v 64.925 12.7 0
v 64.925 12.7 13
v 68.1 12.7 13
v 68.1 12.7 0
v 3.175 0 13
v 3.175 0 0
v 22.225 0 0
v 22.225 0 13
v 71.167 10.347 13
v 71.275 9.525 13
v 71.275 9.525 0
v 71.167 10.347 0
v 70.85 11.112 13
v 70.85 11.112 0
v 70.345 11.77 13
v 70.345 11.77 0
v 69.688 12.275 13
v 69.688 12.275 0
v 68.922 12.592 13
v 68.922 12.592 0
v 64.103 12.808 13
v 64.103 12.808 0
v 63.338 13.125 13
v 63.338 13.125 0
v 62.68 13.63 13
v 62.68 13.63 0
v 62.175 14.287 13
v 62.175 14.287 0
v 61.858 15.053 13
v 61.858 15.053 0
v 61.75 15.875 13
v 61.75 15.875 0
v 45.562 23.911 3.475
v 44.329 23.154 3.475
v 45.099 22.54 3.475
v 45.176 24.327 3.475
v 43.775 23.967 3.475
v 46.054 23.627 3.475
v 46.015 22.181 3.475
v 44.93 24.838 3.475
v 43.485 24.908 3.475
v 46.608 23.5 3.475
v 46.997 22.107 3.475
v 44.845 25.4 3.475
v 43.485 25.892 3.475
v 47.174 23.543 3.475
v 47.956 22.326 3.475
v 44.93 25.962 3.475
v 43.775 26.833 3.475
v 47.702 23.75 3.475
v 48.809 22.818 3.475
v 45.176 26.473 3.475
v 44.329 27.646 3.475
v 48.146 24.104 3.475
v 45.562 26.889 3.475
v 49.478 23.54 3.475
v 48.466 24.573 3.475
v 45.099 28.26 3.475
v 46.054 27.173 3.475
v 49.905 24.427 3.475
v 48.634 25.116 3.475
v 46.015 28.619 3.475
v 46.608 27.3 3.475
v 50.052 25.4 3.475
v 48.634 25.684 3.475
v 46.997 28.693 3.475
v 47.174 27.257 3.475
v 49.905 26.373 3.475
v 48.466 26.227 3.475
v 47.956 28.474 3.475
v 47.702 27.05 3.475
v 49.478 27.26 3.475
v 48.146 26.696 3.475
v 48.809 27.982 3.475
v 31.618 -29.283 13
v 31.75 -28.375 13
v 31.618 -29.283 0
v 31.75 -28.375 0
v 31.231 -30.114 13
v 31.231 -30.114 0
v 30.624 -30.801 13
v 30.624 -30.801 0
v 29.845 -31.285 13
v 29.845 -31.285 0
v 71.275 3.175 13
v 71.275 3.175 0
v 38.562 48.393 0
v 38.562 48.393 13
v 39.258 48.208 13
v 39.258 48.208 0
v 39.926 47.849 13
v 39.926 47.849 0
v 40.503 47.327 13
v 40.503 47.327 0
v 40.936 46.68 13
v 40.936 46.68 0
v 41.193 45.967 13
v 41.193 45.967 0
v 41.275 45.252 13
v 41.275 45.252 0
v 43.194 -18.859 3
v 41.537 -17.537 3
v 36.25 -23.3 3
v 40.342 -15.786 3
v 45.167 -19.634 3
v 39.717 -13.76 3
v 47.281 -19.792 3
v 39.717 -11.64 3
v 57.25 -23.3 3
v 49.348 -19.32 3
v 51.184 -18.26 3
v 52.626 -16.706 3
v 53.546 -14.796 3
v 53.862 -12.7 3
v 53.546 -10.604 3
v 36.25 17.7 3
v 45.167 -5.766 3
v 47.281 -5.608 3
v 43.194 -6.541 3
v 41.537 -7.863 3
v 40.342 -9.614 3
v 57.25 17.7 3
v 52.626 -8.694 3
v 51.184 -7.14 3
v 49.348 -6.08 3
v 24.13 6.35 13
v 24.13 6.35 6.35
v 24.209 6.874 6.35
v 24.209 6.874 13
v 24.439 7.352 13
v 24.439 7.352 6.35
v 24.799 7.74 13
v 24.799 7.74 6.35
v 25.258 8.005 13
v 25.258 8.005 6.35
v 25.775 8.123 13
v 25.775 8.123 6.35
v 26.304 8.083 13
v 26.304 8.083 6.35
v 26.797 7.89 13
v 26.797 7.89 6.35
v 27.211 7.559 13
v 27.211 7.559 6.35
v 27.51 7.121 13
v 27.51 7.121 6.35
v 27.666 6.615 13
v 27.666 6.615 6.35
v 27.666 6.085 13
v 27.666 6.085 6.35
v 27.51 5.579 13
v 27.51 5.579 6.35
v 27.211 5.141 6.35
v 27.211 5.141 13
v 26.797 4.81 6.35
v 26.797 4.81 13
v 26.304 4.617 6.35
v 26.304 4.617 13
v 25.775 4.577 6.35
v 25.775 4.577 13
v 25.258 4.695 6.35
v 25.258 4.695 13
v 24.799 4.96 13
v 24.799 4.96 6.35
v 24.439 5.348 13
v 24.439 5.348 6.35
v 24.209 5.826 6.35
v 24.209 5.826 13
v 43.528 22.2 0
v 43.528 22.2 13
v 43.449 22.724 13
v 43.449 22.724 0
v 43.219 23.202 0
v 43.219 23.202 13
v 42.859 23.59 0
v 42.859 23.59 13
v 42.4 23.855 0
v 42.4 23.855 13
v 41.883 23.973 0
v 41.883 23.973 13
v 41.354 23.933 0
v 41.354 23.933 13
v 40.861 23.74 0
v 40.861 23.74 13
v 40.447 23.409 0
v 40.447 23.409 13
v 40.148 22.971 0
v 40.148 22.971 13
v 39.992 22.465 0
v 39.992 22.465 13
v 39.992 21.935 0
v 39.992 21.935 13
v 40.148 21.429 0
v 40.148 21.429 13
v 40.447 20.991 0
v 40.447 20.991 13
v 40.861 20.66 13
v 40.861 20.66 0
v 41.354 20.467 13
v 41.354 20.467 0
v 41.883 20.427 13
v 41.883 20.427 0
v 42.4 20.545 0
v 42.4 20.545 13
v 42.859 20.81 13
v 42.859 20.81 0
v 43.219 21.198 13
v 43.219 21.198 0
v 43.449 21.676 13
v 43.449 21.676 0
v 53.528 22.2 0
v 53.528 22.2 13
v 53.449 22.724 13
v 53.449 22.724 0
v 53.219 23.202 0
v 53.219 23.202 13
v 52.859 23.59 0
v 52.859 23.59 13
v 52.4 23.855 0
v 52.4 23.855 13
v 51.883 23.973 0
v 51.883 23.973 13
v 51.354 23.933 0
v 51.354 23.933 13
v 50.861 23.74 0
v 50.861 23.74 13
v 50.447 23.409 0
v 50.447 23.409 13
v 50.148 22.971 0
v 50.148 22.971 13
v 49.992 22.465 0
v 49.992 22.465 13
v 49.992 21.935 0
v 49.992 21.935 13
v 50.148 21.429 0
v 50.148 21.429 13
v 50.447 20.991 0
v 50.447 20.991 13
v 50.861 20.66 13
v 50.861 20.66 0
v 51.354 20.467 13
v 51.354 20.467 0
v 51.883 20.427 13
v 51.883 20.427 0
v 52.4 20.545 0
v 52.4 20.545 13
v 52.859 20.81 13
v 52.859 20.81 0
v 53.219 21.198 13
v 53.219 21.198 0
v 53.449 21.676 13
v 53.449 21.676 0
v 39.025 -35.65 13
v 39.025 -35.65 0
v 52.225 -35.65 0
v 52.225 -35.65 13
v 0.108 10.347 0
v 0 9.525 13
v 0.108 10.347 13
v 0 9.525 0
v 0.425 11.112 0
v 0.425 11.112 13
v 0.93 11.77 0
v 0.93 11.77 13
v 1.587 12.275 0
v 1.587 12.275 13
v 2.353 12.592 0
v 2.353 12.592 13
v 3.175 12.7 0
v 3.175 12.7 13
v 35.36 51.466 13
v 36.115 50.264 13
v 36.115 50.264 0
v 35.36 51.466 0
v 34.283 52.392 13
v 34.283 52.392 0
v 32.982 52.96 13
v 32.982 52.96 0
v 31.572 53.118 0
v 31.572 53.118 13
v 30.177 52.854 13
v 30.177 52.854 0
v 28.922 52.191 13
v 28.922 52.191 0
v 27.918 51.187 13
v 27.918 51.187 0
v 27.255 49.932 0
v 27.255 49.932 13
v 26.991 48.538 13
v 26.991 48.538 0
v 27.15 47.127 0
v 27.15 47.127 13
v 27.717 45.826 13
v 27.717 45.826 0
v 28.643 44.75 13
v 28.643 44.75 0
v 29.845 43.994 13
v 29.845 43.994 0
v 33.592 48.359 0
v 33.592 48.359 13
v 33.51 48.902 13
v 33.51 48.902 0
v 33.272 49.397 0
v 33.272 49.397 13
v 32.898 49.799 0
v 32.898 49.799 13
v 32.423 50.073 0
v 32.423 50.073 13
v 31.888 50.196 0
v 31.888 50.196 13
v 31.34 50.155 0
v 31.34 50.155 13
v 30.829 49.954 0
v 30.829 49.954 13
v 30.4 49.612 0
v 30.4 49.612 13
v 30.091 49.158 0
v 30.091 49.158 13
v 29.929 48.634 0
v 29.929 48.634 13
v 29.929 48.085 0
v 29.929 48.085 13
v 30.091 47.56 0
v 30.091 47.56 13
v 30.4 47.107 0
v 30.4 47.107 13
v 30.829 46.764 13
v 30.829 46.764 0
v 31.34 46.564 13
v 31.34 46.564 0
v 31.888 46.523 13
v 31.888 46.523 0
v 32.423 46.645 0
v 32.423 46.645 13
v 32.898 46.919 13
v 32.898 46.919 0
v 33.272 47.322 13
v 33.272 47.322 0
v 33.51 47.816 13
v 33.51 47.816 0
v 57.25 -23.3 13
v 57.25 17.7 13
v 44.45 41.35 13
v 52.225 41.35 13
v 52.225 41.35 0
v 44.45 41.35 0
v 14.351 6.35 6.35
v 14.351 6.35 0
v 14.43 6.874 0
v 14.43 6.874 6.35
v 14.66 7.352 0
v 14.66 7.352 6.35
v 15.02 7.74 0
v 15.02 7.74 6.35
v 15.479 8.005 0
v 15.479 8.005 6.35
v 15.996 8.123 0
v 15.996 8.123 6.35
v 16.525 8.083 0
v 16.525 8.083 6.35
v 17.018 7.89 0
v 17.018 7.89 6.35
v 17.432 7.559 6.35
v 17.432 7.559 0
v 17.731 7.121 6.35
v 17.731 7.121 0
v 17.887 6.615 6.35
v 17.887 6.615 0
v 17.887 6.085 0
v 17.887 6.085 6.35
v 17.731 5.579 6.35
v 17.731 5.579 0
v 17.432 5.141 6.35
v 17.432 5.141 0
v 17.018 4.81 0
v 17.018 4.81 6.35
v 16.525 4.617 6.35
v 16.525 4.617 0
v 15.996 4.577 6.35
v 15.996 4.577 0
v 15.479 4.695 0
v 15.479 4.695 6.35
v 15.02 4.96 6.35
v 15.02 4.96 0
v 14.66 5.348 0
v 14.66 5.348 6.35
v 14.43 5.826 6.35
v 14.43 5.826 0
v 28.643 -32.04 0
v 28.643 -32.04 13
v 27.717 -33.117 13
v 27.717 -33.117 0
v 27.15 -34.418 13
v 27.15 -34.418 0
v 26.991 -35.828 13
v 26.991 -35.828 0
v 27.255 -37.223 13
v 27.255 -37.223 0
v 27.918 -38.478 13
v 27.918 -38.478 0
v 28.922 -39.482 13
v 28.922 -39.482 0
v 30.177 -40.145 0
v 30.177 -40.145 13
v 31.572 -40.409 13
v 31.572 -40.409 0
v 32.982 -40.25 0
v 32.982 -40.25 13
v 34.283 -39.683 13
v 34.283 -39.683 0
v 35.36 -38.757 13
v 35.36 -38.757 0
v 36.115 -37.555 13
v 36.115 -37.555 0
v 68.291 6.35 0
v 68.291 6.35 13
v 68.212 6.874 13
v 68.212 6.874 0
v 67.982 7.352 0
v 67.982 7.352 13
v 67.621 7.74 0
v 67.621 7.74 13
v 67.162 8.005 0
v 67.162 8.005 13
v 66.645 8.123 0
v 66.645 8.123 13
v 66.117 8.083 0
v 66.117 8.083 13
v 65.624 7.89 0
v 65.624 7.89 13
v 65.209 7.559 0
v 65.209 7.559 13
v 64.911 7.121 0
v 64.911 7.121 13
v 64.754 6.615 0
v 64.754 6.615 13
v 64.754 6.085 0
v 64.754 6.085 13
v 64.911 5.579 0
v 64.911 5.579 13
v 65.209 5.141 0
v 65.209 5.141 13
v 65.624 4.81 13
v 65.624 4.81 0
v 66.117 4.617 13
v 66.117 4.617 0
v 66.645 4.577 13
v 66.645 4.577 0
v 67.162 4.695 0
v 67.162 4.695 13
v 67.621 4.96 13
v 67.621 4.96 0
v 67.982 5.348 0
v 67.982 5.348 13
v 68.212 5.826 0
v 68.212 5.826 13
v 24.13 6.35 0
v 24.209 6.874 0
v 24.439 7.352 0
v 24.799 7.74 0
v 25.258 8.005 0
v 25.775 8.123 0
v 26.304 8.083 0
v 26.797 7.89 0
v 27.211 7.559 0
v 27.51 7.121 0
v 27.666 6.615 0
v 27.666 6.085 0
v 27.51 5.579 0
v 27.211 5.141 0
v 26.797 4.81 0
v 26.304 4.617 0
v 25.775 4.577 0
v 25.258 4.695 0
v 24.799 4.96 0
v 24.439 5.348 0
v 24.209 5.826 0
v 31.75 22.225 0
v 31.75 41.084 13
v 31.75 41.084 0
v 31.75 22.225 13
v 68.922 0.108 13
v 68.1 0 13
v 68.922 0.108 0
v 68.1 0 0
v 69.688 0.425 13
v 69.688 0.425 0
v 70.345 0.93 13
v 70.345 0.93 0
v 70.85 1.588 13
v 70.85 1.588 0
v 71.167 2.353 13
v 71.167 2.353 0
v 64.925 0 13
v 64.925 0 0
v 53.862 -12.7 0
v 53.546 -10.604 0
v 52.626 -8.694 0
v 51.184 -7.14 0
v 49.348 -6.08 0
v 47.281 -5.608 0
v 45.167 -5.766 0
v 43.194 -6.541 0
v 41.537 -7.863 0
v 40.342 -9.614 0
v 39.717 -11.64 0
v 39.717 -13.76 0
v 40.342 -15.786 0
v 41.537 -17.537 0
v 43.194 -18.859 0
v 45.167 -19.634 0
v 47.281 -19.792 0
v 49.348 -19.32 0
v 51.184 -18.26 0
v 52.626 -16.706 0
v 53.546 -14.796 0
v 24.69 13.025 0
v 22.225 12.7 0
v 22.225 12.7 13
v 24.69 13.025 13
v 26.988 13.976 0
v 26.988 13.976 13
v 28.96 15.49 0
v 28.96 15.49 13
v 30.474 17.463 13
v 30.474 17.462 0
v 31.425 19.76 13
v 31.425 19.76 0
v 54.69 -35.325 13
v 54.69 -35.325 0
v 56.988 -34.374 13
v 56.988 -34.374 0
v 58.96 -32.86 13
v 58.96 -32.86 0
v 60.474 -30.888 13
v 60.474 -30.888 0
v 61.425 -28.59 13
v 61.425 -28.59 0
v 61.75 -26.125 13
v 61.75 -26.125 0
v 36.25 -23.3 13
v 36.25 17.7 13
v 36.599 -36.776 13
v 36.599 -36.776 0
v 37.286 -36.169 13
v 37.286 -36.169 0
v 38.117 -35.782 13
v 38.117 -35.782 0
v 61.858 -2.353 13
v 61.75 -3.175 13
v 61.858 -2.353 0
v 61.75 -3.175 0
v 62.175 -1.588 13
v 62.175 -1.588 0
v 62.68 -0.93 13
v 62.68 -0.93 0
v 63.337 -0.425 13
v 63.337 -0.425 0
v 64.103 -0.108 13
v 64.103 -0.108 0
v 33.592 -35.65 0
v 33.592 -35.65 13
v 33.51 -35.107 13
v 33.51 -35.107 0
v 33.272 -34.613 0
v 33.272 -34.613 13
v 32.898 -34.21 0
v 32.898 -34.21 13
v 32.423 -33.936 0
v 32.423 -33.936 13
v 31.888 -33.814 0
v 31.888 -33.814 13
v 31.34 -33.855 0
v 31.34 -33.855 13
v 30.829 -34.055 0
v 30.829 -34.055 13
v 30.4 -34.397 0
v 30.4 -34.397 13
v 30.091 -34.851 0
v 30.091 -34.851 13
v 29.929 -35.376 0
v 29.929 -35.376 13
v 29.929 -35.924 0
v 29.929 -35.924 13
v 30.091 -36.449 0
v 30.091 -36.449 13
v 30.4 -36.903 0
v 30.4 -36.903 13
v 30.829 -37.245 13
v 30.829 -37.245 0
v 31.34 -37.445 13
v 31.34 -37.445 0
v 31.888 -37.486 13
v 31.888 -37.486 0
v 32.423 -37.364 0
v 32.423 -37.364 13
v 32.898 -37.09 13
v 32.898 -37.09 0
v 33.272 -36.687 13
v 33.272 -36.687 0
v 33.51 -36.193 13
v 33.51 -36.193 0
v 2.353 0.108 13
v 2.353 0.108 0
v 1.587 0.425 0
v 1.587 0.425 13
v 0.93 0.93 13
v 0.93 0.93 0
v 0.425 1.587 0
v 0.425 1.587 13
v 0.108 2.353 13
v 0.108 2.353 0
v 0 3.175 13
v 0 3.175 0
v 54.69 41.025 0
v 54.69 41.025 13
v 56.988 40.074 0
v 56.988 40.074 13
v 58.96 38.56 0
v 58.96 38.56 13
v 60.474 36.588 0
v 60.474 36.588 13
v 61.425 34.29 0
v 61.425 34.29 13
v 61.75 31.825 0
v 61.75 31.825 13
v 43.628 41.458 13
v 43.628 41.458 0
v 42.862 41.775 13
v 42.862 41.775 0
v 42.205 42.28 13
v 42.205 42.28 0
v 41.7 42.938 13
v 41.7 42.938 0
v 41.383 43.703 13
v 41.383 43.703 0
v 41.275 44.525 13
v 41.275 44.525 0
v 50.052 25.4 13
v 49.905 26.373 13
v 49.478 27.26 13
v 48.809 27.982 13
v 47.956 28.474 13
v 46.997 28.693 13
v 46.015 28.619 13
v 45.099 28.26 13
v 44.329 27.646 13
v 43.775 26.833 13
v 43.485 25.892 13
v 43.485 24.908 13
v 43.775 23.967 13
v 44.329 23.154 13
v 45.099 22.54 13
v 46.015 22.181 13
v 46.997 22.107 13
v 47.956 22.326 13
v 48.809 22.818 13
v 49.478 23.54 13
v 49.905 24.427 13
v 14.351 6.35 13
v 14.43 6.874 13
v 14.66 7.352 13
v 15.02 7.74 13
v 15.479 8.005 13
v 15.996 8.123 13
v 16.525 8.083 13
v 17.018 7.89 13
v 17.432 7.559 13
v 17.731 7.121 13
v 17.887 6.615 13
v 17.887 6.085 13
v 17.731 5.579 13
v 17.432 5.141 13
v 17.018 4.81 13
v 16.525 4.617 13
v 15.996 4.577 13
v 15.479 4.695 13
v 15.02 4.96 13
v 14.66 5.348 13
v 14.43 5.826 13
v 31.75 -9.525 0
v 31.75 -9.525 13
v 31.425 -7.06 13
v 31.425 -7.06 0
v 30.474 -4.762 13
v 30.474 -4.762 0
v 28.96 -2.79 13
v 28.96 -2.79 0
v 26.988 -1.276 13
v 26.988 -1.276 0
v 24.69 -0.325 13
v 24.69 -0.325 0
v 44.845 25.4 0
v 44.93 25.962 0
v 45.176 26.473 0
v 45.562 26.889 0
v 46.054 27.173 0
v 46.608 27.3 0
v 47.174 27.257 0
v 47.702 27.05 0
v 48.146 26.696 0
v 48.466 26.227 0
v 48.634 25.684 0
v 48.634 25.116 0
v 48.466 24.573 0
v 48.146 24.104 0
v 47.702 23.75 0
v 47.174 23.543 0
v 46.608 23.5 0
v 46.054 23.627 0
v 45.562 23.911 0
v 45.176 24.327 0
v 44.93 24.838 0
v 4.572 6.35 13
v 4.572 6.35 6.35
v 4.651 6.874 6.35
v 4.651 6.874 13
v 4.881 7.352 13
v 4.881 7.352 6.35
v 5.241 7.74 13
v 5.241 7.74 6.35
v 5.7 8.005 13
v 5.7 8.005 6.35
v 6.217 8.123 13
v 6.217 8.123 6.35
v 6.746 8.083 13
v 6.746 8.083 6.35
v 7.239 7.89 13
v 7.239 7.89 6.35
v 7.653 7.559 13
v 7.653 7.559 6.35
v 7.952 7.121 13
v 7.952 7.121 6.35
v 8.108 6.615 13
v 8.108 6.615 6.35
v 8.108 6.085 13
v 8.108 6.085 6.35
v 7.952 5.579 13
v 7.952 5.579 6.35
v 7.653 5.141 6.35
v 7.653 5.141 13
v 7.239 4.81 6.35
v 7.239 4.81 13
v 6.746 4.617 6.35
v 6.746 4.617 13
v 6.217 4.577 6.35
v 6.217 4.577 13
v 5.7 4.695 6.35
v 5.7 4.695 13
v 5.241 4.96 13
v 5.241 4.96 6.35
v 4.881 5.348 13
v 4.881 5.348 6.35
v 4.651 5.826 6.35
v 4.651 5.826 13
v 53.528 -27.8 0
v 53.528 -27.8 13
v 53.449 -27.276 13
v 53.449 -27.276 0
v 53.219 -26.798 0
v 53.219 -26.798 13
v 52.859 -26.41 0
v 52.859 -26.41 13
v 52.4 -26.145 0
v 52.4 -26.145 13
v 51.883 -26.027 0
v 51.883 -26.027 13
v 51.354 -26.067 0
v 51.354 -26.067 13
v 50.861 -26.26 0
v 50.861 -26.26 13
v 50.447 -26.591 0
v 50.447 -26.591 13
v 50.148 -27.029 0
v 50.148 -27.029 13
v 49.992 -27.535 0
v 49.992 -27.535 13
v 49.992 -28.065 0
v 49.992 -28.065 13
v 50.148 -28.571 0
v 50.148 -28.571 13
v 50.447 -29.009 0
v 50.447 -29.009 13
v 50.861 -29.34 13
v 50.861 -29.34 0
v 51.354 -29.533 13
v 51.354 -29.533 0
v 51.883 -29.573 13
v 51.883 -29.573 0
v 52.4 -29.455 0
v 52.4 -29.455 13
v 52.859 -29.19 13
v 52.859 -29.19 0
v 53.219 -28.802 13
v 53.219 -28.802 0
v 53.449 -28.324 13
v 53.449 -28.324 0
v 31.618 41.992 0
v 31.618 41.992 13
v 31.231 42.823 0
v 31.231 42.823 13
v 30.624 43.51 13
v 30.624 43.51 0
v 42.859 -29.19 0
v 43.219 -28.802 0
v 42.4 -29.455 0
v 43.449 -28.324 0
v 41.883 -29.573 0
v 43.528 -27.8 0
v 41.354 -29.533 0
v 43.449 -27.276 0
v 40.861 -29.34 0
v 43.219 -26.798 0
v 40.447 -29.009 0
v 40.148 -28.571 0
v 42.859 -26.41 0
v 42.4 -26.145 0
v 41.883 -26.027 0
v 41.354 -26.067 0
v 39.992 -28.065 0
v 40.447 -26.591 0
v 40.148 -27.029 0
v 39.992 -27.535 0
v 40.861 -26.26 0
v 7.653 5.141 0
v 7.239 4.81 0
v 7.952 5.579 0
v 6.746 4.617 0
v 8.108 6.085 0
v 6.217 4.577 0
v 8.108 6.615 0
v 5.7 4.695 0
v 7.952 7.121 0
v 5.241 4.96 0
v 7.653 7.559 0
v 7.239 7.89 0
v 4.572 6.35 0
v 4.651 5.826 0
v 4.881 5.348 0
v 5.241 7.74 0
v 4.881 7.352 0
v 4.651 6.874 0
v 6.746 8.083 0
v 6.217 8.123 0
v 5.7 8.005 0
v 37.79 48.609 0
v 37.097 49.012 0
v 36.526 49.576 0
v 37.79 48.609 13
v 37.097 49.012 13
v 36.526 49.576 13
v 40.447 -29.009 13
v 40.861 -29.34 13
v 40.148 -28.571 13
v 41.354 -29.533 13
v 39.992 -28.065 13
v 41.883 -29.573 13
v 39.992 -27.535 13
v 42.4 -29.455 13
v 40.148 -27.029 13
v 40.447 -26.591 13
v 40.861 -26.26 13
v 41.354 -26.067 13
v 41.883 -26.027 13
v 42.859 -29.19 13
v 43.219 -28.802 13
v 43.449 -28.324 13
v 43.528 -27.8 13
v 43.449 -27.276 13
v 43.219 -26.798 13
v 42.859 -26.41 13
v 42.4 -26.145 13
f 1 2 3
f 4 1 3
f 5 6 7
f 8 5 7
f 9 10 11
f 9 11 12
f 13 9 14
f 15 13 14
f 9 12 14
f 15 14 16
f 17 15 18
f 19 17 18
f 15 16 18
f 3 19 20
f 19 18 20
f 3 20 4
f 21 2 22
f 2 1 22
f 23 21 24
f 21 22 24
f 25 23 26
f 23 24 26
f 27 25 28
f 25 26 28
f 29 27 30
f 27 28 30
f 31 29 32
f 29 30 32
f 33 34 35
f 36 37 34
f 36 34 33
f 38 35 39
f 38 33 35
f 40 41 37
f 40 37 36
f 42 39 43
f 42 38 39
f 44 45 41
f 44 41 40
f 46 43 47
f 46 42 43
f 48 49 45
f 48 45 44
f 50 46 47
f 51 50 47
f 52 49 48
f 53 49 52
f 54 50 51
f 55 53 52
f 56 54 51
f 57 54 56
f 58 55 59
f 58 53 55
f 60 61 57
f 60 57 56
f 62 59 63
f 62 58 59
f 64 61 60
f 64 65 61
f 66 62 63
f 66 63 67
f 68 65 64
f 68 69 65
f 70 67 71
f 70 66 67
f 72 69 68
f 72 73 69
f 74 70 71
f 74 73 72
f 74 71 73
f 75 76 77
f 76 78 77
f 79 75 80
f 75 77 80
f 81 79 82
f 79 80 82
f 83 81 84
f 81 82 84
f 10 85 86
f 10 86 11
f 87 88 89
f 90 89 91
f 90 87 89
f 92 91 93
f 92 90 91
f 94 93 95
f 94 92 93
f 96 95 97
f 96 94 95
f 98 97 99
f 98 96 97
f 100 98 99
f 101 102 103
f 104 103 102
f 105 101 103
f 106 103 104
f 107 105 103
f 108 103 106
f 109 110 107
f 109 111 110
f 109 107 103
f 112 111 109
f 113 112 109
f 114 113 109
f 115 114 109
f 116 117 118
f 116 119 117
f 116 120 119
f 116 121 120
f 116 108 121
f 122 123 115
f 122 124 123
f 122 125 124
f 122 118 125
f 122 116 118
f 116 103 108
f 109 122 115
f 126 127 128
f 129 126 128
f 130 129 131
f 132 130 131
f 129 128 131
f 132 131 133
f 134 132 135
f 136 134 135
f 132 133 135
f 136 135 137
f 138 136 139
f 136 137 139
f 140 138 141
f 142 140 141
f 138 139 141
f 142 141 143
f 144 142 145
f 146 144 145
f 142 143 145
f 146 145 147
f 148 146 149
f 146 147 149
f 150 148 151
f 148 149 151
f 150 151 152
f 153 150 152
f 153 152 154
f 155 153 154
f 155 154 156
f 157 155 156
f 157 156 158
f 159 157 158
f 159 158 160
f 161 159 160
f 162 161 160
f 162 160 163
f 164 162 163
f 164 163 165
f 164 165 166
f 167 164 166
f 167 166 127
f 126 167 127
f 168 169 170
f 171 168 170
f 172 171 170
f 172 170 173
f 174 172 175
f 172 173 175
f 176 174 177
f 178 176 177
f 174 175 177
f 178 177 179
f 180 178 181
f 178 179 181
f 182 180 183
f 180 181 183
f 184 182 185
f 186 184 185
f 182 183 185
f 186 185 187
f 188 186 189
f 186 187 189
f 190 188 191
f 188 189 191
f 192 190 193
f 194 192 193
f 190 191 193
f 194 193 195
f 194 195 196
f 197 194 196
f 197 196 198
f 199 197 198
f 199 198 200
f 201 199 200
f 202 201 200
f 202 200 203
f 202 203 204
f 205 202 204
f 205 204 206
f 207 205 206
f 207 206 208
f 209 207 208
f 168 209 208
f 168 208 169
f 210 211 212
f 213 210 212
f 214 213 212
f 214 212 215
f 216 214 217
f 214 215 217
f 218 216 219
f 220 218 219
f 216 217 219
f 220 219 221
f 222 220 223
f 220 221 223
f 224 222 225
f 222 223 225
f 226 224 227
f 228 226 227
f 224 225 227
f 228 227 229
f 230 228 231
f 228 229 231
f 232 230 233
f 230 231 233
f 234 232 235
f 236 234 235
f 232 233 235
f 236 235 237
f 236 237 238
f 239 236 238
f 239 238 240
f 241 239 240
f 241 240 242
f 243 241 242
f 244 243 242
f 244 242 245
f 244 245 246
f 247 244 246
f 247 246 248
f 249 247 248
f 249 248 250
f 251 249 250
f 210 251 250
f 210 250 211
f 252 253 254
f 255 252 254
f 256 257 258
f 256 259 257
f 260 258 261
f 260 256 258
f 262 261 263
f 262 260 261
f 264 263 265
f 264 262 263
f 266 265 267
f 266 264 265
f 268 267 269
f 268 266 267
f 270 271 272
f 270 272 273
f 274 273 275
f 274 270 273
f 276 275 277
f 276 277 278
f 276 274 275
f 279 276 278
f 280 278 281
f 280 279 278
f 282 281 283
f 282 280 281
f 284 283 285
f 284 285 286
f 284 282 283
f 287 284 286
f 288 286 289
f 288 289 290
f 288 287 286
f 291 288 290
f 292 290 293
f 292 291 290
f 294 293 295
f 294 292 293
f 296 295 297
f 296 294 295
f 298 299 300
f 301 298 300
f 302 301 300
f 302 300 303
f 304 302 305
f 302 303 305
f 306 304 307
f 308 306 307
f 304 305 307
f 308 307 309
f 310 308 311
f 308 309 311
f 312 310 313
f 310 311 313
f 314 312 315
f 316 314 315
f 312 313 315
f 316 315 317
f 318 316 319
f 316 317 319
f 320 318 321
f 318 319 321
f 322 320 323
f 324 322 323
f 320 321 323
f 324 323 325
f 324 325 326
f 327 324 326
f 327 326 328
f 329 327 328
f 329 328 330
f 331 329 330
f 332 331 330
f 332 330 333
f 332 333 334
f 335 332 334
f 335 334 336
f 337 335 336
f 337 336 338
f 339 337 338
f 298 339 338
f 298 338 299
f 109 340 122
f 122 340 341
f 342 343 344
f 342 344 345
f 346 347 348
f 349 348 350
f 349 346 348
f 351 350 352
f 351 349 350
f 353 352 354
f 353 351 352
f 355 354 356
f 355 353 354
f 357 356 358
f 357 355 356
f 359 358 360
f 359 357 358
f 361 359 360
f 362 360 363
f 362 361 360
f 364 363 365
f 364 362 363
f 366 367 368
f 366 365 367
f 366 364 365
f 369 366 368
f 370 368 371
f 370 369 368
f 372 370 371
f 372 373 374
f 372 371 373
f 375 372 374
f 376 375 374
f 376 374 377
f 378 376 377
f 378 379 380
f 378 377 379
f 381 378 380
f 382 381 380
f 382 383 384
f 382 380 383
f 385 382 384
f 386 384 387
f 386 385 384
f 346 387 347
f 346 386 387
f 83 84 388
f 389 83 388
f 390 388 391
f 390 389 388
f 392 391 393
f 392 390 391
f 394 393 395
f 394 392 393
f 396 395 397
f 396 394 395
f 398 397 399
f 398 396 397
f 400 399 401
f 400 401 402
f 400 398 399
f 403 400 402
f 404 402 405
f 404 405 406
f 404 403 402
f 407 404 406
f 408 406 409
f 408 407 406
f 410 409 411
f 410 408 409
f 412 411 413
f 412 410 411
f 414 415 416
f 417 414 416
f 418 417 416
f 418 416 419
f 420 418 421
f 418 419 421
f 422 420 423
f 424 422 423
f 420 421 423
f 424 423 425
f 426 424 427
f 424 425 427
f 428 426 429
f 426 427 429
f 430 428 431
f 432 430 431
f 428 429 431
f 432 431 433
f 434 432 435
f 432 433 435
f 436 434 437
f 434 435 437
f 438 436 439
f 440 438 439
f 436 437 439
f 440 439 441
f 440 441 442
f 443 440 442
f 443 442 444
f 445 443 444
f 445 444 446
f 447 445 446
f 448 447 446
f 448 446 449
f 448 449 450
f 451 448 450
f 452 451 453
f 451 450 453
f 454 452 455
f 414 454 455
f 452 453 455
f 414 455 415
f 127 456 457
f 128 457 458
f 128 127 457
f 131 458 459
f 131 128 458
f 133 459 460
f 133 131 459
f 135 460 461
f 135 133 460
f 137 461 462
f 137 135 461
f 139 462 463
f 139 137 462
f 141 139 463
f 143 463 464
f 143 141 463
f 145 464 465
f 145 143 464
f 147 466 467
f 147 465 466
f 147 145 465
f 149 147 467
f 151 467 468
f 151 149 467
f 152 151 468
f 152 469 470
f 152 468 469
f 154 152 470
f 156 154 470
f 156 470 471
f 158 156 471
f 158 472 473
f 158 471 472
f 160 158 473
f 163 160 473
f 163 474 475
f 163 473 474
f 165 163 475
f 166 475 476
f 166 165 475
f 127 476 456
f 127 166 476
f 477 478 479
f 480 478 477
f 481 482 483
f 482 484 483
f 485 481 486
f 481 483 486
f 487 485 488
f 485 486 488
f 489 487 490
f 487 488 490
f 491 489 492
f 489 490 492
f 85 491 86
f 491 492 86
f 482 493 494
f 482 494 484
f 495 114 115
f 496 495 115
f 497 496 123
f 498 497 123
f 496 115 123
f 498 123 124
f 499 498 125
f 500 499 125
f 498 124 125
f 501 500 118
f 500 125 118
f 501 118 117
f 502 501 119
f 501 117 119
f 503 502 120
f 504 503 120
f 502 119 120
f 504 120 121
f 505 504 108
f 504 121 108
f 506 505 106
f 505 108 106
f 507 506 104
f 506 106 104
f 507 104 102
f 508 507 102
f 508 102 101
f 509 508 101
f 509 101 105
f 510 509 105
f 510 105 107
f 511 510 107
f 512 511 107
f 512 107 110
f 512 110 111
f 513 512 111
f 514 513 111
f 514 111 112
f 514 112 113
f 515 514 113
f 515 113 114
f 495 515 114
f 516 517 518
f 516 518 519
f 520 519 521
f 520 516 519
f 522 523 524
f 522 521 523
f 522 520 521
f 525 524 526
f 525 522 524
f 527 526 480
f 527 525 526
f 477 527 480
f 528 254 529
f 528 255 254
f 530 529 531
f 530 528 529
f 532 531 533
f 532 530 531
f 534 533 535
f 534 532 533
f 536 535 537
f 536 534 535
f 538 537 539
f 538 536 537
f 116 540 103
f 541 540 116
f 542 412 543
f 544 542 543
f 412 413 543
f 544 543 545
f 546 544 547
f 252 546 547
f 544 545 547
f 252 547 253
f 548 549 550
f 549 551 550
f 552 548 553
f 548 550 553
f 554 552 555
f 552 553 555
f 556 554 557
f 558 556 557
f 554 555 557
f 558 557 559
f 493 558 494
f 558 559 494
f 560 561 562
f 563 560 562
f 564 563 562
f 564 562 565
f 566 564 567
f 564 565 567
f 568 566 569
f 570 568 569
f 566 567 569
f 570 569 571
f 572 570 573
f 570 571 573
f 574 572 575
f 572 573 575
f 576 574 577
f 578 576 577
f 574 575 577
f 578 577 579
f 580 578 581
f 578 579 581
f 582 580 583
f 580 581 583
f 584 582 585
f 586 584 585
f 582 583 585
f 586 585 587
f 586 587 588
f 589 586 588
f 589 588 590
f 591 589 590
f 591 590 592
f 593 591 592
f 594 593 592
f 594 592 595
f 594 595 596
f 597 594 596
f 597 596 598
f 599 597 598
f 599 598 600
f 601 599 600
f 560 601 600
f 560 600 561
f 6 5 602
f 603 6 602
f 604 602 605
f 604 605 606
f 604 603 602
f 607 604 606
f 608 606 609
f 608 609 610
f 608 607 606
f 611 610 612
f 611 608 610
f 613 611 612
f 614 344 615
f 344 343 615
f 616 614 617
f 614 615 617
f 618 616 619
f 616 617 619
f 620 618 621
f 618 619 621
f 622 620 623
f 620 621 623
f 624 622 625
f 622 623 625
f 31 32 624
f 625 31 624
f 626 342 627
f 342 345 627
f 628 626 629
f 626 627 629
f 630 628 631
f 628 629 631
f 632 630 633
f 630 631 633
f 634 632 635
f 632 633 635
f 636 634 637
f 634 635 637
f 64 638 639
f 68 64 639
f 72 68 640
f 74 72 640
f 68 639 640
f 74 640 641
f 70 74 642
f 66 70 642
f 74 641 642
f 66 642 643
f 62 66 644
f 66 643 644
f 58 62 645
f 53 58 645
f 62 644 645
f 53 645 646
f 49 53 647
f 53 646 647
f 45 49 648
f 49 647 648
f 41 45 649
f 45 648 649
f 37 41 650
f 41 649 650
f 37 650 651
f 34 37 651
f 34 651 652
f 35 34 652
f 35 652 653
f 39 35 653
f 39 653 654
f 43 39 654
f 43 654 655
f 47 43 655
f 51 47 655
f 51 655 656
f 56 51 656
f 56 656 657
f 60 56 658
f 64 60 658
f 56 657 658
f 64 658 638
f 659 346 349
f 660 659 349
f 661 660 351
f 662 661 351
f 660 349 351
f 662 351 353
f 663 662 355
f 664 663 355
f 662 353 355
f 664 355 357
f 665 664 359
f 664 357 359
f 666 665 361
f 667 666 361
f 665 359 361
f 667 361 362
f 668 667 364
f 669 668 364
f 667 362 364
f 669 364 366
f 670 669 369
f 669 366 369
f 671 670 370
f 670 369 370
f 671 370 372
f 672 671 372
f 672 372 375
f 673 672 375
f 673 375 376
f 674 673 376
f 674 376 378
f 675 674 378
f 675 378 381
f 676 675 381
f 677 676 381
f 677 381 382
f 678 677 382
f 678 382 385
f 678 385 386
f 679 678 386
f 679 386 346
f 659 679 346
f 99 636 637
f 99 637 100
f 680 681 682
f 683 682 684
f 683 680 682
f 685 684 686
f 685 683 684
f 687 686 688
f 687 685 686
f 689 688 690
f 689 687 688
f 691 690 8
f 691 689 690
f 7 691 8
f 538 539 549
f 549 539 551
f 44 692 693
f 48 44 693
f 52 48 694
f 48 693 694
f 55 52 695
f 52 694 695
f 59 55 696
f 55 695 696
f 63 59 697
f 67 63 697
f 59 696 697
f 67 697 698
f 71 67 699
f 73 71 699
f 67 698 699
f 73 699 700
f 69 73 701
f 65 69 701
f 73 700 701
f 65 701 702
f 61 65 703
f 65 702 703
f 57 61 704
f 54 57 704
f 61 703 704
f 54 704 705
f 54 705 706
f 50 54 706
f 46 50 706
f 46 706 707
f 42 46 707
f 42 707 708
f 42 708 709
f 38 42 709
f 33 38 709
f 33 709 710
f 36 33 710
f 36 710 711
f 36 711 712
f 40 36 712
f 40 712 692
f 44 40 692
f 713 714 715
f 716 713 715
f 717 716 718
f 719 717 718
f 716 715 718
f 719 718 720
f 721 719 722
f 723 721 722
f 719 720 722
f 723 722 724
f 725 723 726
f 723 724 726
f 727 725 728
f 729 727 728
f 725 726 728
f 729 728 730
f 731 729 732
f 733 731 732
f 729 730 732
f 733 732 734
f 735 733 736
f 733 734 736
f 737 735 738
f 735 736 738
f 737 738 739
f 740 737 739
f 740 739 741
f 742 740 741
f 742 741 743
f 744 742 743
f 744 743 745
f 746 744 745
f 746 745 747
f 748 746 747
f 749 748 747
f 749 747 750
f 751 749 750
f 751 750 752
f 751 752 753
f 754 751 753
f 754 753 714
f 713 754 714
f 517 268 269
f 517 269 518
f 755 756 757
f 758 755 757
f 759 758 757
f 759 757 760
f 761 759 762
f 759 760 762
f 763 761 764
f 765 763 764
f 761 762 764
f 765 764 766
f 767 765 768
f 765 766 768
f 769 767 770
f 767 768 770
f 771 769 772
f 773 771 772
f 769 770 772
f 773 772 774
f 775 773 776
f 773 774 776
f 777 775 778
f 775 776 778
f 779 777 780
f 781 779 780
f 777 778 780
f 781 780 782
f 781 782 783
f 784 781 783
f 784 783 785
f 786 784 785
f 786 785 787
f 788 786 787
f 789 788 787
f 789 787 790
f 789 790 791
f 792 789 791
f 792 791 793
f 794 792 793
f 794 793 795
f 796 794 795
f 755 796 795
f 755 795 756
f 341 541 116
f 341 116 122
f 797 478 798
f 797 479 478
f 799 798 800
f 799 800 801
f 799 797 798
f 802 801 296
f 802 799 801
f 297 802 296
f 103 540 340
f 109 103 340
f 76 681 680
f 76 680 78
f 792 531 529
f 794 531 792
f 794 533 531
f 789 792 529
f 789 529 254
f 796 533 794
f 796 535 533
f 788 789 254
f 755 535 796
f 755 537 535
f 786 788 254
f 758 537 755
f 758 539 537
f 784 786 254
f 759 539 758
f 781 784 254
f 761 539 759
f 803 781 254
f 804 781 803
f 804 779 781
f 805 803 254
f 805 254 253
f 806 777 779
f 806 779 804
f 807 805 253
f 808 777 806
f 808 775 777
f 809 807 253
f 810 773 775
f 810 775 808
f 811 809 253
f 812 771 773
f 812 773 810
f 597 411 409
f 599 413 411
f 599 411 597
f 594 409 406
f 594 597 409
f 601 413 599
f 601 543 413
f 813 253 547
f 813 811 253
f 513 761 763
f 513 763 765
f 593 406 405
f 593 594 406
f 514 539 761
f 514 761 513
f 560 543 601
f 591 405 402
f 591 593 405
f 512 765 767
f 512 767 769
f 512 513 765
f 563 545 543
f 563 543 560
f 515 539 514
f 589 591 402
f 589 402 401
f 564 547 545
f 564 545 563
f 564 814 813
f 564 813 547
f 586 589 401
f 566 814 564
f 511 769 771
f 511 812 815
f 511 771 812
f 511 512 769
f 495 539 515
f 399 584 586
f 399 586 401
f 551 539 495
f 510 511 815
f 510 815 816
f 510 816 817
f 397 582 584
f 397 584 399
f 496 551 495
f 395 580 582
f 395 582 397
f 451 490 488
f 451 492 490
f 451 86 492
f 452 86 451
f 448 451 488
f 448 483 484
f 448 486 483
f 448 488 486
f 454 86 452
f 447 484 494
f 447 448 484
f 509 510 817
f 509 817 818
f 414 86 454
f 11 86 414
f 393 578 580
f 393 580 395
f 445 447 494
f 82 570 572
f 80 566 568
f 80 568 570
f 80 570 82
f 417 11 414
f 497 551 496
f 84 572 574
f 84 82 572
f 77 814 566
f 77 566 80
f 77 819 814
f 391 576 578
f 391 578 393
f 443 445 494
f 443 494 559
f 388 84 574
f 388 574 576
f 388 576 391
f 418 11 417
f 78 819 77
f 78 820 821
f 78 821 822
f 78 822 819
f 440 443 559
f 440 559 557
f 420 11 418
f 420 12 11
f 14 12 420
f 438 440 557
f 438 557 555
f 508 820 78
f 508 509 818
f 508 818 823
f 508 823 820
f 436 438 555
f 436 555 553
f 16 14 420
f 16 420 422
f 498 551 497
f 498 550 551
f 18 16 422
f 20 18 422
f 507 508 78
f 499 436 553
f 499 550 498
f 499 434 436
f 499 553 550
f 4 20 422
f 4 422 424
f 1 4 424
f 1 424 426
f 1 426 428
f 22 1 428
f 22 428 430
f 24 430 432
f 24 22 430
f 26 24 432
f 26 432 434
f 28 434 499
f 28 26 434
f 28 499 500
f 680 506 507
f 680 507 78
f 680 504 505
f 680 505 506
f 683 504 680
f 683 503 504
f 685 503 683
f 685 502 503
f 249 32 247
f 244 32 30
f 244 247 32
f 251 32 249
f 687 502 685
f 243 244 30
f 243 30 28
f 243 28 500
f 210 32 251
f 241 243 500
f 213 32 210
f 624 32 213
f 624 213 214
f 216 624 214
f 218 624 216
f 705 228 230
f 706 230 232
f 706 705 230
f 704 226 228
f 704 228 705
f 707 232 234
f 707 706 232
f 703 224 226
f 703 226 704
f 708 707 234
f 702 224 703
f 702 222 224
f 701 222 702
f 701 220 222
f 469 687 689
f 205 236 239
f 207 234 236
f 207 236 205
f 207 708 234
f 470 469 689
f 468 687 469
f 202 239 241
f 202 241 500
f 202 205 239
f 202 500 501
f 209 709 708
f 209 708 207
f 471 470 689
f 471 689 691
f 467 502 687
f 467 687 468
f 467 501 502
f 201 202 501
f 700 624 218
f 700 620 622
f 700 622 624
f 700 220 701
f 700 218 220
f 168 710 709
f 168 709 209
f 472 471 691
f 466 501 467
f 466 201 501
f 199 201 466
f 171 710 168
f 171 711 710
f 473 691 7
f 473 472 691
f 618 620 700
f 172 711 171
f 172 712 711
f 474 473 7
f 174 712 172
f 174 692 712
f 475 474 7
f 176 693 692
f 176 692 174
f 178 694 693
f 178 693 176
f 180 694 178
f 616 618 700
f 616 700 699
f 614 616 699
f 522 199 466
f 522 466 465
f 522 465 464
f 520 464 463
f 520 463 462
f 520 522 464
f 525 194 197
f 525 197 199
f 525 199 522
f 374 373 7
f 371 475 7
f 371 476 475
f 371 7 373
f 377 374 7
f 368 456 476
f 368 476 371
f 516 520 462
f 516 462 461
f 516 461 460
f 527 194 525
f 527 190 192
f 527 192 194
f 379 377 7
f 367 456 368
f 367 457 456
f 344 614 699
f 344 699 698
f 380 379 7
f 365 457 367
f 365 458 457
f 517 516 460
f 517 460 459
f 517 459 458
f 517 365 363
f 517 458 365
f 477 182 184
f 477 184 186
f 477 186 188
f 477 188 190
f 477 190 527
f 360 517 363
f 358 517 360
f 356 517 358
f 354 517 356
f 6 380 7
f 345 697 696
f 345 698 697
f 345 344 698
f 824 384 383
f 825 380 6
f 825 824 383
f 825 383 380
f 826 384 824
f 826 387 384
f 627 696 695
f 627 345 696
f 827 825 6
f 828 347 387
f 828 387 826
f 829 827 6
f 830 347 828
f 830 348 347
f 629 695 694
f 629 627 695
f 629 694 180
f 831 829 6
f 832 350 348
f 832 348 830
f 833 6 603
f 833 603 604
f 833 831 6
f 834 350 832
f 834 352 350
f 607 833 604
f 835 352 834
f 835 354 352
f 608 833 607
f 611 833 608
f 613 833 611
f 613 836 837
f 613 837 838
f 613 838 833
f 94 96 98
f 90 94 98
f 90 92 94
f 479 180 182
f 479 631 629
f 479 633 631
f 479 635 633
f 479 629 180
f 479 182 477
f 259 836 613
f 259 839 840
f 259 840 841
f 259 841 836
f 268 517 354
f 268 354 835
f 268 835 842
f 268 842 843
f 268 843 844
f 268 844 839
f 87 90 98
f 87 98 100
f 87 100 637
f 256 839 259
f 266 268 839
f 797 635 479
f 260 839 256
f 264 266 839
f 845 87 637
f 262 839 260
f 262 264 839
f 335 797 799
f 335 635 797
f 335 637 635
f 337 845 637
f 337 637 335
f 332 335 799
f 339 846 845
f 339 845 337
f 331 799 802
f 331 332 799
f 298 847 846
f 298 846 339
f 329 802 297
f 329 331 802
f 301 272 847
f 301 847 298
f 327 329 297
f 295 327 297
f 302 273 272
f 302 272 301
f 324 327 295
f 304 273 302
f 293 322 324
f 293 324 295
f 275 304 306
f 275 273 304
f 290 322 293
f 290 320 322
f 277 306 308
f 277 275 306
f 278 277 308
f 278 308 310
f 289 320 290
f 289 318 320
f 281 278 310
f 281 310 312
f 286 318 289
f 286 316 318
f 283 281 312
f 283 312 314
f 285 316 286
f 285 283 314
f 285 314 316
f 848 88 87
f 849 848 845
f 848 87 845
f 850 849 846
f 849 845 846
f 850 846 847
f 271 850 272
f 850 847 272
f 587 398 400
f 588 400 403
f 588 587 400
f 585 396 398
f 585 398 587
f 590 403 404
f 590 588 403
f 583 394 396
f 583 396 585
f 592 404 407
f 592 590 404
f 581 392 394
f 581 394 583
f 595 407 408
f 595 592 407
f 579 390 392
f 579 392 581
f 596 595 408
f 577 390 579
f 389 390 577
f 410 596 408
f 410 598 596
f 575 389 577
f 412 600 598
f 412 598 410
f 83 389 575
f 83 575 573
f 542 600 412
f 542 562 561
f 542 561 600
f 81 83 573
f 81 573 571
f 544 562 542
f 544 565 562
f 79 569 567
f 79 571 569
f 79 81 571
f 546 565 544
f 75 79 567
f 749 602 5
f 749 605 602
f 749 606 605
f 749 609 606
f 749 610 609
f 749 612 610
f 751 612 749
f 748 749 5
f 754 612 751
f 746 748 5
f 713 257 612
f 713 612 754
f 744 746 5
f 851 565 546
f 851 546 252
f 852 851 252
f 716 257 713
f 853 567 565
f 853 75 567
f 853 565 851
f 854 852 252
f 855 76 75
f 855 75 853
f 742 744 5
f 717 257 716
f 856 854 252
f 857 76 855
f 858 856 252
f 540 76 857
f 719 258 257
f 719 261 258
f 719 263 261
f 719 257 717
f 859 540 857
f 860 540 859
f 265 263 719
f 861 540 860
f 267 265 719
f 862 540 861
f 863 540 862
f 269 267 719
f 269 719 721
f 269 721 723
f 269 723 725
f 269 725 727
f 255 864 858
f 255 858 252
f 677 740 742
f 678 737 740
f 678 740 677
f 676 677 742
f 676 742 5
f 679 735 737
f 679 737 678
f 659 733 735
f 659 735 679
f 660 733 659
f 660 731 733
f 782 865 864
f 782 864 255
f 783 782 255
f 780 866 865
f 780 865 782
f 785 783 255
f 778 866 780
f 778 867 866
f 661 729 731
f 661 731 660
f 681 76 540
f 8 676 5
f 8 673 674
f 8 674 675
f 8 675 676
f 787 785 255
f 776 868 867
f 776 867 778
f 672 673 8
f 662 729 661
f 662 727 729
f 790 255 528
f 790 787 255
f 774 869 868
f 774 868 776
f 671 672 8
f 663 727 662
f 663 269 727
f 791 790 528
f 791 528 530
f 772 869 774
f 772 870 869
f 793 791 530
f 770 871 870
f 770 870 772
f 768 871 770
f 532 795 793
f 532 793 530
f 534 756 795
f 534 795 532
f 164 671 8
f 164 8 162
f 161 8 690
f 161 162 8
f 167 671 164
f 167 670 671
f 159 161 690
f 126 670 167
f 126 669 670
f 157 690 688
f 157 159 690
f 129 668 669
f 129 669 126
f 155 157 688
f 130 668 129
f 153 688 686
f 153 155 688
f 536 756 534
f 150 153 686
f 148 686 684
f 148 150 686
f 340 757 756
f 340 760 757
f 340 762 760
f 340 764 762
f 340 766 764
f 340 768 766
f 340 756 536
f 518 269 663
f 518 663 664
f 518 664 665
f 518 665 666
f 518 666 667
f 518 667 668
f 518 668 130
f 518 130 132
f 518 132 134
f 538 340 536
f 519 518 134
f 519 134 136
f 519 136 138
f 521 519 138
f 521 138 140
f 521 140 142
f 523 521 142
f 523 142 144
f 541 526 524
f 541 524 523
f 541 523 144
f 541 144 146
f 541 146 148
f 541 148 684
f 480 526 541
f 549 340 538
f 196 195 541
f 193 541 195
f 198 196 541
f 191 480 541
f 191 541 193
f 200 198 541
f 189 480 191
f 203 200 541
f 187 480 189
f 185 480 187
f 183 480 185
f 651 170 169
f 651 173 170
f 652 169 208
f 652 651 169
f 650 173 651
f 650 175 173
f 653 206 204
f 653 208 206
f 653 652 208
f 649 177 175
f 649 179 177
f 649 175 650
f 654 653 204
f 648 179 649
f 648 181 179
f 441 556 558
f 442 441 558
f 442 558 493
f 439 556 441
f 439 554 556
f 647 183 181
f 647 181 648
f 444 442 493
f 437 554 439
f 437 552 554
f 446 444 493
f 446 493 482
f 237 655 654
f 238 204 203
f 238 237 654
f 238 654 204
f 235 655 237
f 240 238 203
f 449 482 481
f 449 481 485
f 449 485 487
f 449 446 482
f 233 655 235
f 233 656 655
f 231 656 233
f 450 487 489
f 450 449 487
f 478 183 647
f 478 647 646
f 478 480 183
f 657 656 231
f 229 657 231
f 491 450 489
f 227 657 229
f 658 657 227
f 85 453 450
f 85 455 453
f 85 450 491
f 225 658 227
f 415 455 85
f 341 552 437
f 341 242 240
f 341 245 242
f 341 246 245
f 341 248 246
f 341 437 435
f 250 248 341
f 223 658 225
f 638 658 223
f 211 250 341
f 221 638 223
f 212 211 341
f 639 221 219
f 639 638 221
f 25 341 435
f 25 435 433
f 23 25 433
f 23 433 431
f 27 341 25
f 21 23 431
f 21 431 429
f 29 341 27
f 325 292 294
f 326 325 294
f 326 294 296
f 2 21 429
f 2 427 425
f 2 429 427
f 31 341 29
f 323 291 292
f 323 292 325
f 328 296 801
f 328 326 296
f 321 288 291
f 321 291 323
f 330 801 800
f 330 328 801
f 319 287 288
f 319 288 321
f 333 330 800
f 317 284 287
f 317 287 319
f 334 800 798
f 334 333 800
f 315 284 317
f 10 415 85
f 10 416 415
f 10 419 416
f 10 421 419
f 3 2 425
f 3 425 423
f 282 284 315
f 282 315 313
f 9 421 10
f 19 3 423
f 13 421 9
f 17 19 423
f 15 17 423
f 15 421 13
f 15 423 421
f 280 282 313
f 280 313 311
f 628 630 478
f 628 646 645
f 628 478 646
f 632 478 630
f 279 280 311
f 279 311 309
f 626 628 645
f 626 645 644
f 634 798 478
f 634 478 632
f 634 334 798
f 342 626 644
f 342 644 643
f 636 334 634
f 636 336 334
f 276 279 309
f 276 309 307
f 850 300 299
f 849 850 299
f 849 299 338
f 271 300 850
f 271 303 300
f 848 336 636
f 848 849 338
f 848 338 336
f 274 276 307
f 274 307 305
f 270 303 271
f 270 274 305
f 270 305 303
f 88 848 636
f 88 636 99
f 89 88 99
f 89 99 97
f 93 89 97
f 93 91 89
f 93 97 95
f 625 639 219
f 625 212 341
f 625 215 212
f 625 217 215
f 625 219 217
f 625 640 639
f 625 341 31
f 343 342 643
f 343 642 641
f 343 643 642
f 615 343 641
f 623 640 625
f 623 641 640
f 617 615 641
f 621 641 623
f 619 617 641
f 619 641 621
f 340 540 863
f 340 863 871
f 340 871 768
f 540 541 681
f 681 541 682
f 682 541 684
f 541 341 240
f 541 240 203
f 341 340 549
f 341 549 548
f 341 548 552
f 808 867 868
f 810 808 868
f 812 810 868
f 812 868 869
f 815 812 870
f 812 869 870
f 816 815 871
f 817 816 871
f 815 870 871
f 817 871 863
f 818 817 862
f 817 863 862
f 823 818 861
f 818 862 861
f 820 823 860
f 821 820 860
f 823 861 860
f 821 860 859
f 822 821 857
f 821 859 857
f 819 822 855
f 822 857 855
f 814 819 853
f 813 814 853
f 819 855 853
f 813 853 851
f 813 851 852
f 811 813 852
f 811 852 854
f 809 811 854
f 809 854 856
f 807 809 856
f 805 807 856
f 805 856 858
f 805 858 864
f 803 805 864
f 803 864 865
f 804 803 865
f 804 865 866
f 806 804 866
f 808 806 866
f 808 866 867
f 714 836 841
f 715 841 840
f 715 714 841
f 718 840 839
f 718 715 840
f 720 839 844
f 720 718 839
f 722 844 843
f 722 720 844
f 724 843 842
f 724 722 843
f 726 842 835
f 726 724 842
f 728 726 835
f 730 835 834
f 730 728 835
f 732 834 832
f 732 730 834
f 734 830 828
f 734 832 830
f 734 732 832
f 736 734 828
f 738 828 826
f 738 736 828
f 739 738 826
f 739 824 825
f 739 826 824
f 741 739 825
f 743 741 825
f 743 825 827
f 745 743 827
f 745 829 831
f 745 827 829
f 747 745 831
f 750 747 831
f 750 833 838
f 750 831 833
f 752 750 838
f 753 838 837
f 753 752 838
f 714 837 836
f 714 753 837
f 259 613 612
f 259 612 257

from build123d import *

# Parameters (mm, degrees)
SKETCH1_W               = 31.75
SKETCH1_H               = 12.7
SKETCH1_W_2             = 30
SKETCH1_H_2             = 7
BOSS_EXTRUDE1_DEPTH     = 13
SKETCH4_R               = 1.778
CUT_EXTRUDE3_DEPTH      = 14
SKETCH5_W               = 21
SKETCH5_H               = 41
CUT_EXTRUDE4_DEPTH      = 10
SKETCH6_R               = 7.112
CUT_EXTRUDE5_DEPTH      = 4
SKETCH7_W               = 31.75
SKETCH7_H               = 12.7
CUT_EXTRUDE6_DEPTH      = 6.35
SKETCH10_R              = 1.905
CUT_EXTRUDE8_DEPTH      = 14
SKETCH11_R              = 3.302
CUT_EXTRUDE9_DEPTH      = 9.525
SKETCH13_W              = 9.525
SKETCH13_H              = 12.7
SKETCH13_R              = 1.778
BOSS_EXTRUDE2_DEPTH     = 13
BOSS_EXTRUDE3_DEPTH     = 13
SKETCH18_R              = 1.8415
CUT_EXTRUDE10_DEPTH     = 14
FILLET1_R               = 9.525
FILLET2_R               = 3.175
SKETCH19_W              = 22.225
SKETCH19_H              = 12.7
BOSS_EXTRUDE4_DEPTH     = 7.62
SKETCH8_R               = 1.778
CUT_EXTRUDE7_DEPTH      = 7.35
CUT_EXTRUDE7_DEPTH_BACK = 17.78
FILLET3_R               = 3.175


with BuildPart() as part:
    # Sketch1 → Boss-Extrude1 (new body)
    with BuildSketch(Plane.XY):
        Polygon((31.75, 12.7), (31.75, 0), (31.75, -28.65), (61.75, -28.65), (61.75, 0), (61.75, 12.7), (61.75, 41.35), (31.75, 41.35), align=None)
        with Locations((15.875, 6.35)):
            Rectangle(SKETCH1_W, SKETCH1_H)
        with Locations((46.75, -32.15)):
            Rectangle(SKETCH1_W_2, SKETCH1_H_2)
    extrude(amount=BOSS_EXTRUDE1_DEPTH)

    # Sketch4 → Cut-Extrude3 (cut, through all)
    with BuildSketch(Plane.XY.offset(13)):
        with Locations((41.75, 22.199999832)):
            Circle(SKETCH4_R)
        with Locations((51.75, 22.199999832)):
            Circle(SKETCH4_R)
        with Locations((41.75, -27.800000168)):
            Circle(SKETCH4_R)
        with Locations((51.75, -27.800000168)):
            Circle(SKETCH4_R)
    extrude(amount=-CUT_EXTRUDE3_DEPTH, mode=Mode.SUBTRACT)

    # Sketch5 → Cut-Extrude4 (cut)
    with BuildSketch(Plane.XY.offset(13)):
        with Locations((46.75, -2.800000024)):
            Rectangle(SKETCH5_W, SKETCH5_H)
    extrude(amount=-CUT_EXTRUDE4_DEPTH, mode=Mode.SUBTRACT)

    # Sketch6 → Cut-Extrude5 (cut, through all)
    with BuildSketch(Plane.XY.offset(3)):
        with Locations((46.75, -12.700000168)):
            Circle(SKETCH6_R)
    extrude(amount=-CUT_EXTRUDE5_DEPTH, mode=Mode.SUBTRACT)

    # Sketch7 → Cut-Extrude6 (cut)
    with BuildSketch(Plane(origin=(0, 0, 0), x_dir=(-1, 0, 0), z_dir=(0, 0, -1))):
        with Locations((-15.875, 6.35)):
            Rectangle(SKETCH7_W, SKETCH7_H)
    extrude(amount=-CUT_EXTRUDE6_DEPTH, mode=Mode.SUBTRACT)

    # Sketch10 → Cut-Extrude8 (cut, through all)
    with BuildSketch(Plane(origin=(0, 0, 0), x_dir=(-1, 0, 0), z_dir=(0, 0, -1))):
        with Locations((-46.75, 25.4)):
            Circle(SKETCH10_R)
    extrude(amount=-CUT_EXTRUDE8_DEPTH, mode=Mode.SUBTRACT)

    # Sketch11 → Cut-Extrude9 (cut)
    with BuildSketch(Plane.XY.offset(13)):
        with Locations((46.75, 25.4)):
            Circle(SKETCH11_R)
    extrude(amount=-CUT_EXTRUDE9_DEPTH, mode=Mode.SUBTRACT)

    # Sketch13 → Boss-Extrude2 (add)
    with BuildSketch(Plane.XY.offset(13)):
        with Locations((66.5125, 6.35)):
            Rectangle(SKETCH13_W, SKETCH13_H)
        with Locations((66.5125, 6.35)):
            Circle(SKETCH13_R, mode=Mode.SUBTRACT)
    extrude(amount=-BOSS_EXTRUDE2_DEPTH)

    # Sketch17 → Boss-Extrude3 (add)
    with BuildSketch(Plane.XY.offset(13)):
        with BuildLine():
            ThreePointArc((36.5125, 48.359214074), (28.382403955, 51.726810119), (31.75, 43.596714074))
            Line((31.75, 43.596714074), (31.75, 48.359214074))
            Line((31.75, 48.359214074), (36.5125, 48.359214074))
        make_face()
        with BuildLine():
            Line((31.75, 48.359214074), (31.75, 43.596714074))
            ThreePointArc((31.75, 43.596714074), (35.117596045, 44.991618029), (36.5125, 48.359214074))
            Line((36.5125, 48.359214074), (31.75, 48.359214074))
        make_face()
        with BuildLine():
            Line((31.75, 43.596714074), (31.75, 41.35))
            Line((31.75, 41.35), (41.275, 41.35))
            Line((41.275, 41.35), (41.275, 48.359214074))
            Line((41.275, 48.359214074), (36.5125, 48.359214074))
            ThreePointArc((36.5125, 48.359214074), (35.117596045, 44.991618029), (31.75, 43.596714074))
        make_face()
        with BuildLine():
            Line((31.75, -35.65), (36.5125, -35.65))
            ThreePointArc((36.5125, -35.65), (35.117596045, -32.282403955), (31.75, -30.8875))
            Line((31.75, -30.8875), (31.75, -35.65))
        make_face()
        with BuildLine():
            ThreePointArc((31.75, -30.8875), (28.382403955, -39.017596045), (36.5125, -35.65))
            Line((36.5125, -35.65), (31.75, -35.65))
            Line((31.75, -35.65), (31.75, -30.8875))
        make_face()
    extrude(amount=-BOSS_EXTRUDE3_DEPTH)

    # Sketch18 → Cut-Extrude10 (cut, through all)
    with BuildSketch(Plane.XY.offset(13)):
        with Locations((31.75, -35.65)):
            Circle(SKETCH18_R)
        with Locations((31.75, 48.359214074)):
            Circle(SKETCH18_R)
    extrude(amount=-CUT_EXTRUDE10_DEPTH, mode=Mode.SUBTRACT)

    # Fillet1
    fillet1_edges = [part.edges().sort_by_distance(p)[0] for p in [
        (31.75, 0, 9.675),
        (31.75, 12.7, 9.675),
        (61.75, 41.35, 6.5),
        (61.75, -35.65, 6.5),
    ]]
    fillet(fillet1_edges, radius=FILLET1_R)

    # Fillet2
    fillet2_edges = [part.edges().sort_by_distance(p)[0] for p in [
        (71.275, 0, 6.5),
        (71.275, 12.7, 6.5),
        (61.75, 12.7, 6.5),
        (61.75, 0, 6.5),
        (31.75, -30.8875, 6.5),
        (36.5125, -35.65, 6.5),
        (31.75, 43.596714074, 6.5),
        (41.275, 41.35, 6.5),
        (36.5125, 48.359214074, 6.5),
    ]]
    fillet(fillet2_edges, radius=FILLET2_R)

    # Sketch19 → Boss-Extrude4 (add)
    with BuildSketch(Plane.XY):
        with BuildLine():
            ThreePointArc((31.75, -9.525), (28.960192091, -2.789807909), (22.225, 0))
            Line((22.225, 0), (22.225, 12.7))
            ThreePointArc((22.225, 12.7), (28.960192091, 15.489807909), (31.75, 22.225))
            Line((31.75, 22.225), (31.75, -9.525))
        make_face()
        with Locations((11.1125, 6.35)):
            Rectangle(SKETCH19_W, SKETCH19_H)
    extrude(amount=BOSS_EXTRUDE4_DEPTH)

    # Sketch8 → Cut-Extrude7 (cut, two sides)
    with BuildSketch(Plane(origin=(0, 0, 6.35), x_dir=(-1, 0, 0), z_dir=(0, 0, -1))) as cut_extrude7_sk:
        with Locations((-6.35, 6.35)):
            Circle(SKETCH8_R)
        with Locations((-25.908, 6.35)):
            Circle(SKETCH8_R)
        with Locations((-16.129, 6.35)):
            Circle(SKETCH8_R)
    extrude(amount=CUT_EXTRUDE7_DEPTH, mode=Mode.SUBTRACT)
    extrude(cut_extrude7_sk.sketch, amount=-CUT_EXTRUDE7_DEPTH_BACK, mode=Mode.SUBTRACT)

    # Fillet3
    fillet3_edges = [part.edges().sort_by_distance(p)[0] for p in [
        (41.275, 48.359214074, 6.5),
        (0, 12.7, 6.5),
        (0, 0, 6.5),
    ]]
    fillet(fillet3_edges, radius=FILLET3_R)


solid = part.part
